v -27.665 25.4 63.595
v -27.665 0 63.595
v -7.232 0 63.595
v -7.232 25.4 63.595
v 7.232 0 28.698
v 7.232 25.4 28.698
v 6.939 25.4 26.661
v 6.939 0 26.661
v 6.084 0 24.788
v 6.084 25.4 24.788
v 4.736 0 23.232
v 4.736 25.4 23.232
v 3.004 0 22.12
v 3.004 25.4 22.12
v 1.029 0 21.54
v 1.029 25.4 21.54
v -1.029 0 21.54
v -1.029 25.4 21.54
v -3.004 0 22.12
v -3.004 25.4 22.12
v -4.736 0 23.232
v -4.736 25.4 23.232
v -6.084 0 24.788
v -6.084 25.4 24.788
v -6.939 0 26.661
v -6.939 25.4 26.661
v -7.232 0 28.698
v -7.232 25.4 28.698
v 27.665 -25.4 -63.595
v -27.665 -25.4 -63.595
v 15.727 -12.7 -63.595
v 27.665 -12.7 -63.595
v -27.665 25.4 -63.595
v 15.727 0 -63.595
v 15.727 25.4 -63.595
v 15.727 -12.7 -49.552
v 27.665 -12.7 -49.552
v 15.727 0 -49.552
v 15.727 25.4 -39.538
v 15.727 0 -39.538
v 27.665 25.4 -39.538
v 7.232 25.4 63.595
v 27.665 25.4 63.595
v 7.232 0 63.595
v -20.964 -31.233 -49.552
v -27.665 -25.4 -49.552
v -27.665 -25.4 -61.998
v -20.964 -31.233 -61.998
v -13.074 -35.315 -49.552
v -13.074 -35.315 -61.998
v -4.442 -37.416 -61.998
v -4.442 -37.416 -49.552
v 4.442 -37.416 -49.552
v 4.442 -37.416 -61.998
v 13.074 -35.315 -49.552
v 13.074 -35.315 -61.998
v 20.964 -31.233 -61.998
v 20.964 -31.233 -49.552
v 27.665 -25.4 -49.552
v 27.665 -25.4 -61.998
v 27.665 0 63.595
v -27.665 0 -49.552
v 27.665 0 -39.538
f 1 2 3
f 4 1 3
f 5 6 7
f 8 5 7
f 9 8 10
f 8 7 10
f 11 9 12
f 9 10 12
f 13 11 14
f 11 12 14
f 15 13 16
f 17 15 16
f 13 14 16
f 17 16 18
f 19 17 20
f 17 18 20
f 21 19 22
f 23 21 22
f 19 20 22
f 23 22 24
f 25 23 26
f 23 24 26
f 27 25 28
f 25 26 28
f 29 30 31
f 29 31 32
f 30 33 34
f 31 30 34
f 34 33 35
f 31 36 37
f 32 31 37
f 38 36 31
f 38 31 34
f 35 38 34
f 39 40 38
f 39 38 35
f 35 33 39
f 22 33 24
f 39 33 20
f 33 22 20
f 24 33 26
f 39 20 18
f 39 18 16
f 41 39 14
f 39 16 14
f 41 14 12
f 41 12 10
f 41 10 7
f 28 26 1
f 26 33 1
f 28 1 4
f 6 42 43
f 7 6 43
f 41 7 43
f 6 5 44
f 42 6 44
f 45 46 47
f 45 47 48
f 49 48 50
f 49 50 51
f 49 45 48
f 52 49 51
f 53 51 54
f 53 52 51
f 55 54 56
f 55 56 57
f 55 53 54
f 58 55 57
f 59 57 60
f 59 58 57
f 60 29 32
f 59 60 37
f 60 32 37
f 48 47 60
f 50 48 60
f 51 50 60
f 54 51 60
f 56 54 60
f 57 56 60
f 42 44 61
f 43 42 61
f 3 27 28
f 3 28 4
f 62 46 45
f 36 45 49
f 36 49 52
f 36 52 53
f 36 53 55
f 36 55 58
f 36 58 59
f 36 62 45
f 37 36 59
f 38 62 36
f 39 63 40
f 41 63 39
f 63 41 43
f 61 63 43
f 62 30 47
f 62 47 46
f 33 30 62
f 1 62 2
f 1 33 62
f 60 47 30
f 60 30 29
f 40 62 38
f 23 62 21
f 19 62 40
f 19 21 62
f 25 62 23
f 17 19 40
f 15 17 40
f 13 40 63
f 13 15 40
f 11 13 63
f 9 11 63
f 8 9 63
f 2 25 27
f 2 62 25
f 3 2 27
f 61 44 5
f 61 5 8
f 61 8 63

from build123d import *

# Parameters (mm, degrees)
F0_W      = 55.3297251463
F0_H      = 127.18950212
F1_DEPTH  = 25.4
F2_W      = 7.2318934835
F2_H      = 34.8967574537
F3_DEPTH  = 25.4
F5_DEPTH  = 25.4
F6_W      = 55.3297251463
F6_H      = 14.0431076288
F7_DEPTH  = 25.4
F9_DEPTH  = 12.446
F10_W     = 25.4
F10_H     = 24.0572243929
F11_DEPTH = 11.938
F12_W     = 11.938
F12_H     = 12.7
F13_DEPTH = 25.4


with BuildPart() as f1:
    # F0 (on Front) → F1 (new body)
    with BuildSketch(Plane.XZ):
        Rectangle(F0_W, F0_H)
    extrude(amount=-F1_DEPTH)

    # F2 (on face) → F3 (cut)
    with BuildSketch(Plane.XZ):
        with Locations((-3.6159467418, 46.1463723332)):
            Rectangle(F2_W, F2_H)
        with Locations((3.6159467418, 46.1463723332)):
            Rectangle(F2_W, F2_H)
    extrude(amount=-F3_DEPTH, mode=Mode.SUBTRACT)

    # F4 (on face) → F5 (cut)
    with BuildSketch(Plane(origin=(0, 25.4, 0), x_dir=(-1, 0, 0), z_dir=(0, 1, 0))):
        with BuildLine():
            Line((7.2318934835, 28.6979936063), (-7.2318934835, 28.6979936063))
            ThreePointArc((-7.2318934835, 28.6979936063), (0, 21.4661001228), (7.2318934835, 28.6979936063))
        make_face()
    extrude(amount=-F5_DEPTH, mode=Mode.SUBTRACT)

    # F6 (on face) → F7 (join)
    with BuildSketch(Plane.XZ):
        with Locations((0, -56.5731972456)):
            Rectangle(F6_W, F6_H)
    extrude(amount=F7_DEPTH)

    # F8 (on face) → F9 (join)
    with BuildSketch(Plane.XY.offset(-49.5516434312)):
        with BuildLine():
            Line((27.6648625731, -25.4), (-27.6648625731, -25.4))
            ThreePointArc((-27.6648625731, -25.4), (0, -37.6812428416), (27.6648625731, -25.4))
        make_face()
    extrude(amount=-F9_DEPTH)

    # F10 (on face) → F11 (cut)
    with BuildSketch(Plane.YZ.offset(27.6648625731)):
        with Locations((12.7, -51.5661388636)):
            Rectangle(F10_W, F10_H)
    extrude(amount=-F11_DEPTH, mode=Mode.SUBTRACT)

    # F12 (on face) → F13 (cut)
    with BuildSketch(Plane.XY.offset(-49.5516434312)):
        with Locations((21.6958625731, -6.35)):
            Rectangle(F12_W, F12_H)
    extrude(amount=-F13_DEPTH, mode=Mode.SUBTRACT)


solid = f1.part
